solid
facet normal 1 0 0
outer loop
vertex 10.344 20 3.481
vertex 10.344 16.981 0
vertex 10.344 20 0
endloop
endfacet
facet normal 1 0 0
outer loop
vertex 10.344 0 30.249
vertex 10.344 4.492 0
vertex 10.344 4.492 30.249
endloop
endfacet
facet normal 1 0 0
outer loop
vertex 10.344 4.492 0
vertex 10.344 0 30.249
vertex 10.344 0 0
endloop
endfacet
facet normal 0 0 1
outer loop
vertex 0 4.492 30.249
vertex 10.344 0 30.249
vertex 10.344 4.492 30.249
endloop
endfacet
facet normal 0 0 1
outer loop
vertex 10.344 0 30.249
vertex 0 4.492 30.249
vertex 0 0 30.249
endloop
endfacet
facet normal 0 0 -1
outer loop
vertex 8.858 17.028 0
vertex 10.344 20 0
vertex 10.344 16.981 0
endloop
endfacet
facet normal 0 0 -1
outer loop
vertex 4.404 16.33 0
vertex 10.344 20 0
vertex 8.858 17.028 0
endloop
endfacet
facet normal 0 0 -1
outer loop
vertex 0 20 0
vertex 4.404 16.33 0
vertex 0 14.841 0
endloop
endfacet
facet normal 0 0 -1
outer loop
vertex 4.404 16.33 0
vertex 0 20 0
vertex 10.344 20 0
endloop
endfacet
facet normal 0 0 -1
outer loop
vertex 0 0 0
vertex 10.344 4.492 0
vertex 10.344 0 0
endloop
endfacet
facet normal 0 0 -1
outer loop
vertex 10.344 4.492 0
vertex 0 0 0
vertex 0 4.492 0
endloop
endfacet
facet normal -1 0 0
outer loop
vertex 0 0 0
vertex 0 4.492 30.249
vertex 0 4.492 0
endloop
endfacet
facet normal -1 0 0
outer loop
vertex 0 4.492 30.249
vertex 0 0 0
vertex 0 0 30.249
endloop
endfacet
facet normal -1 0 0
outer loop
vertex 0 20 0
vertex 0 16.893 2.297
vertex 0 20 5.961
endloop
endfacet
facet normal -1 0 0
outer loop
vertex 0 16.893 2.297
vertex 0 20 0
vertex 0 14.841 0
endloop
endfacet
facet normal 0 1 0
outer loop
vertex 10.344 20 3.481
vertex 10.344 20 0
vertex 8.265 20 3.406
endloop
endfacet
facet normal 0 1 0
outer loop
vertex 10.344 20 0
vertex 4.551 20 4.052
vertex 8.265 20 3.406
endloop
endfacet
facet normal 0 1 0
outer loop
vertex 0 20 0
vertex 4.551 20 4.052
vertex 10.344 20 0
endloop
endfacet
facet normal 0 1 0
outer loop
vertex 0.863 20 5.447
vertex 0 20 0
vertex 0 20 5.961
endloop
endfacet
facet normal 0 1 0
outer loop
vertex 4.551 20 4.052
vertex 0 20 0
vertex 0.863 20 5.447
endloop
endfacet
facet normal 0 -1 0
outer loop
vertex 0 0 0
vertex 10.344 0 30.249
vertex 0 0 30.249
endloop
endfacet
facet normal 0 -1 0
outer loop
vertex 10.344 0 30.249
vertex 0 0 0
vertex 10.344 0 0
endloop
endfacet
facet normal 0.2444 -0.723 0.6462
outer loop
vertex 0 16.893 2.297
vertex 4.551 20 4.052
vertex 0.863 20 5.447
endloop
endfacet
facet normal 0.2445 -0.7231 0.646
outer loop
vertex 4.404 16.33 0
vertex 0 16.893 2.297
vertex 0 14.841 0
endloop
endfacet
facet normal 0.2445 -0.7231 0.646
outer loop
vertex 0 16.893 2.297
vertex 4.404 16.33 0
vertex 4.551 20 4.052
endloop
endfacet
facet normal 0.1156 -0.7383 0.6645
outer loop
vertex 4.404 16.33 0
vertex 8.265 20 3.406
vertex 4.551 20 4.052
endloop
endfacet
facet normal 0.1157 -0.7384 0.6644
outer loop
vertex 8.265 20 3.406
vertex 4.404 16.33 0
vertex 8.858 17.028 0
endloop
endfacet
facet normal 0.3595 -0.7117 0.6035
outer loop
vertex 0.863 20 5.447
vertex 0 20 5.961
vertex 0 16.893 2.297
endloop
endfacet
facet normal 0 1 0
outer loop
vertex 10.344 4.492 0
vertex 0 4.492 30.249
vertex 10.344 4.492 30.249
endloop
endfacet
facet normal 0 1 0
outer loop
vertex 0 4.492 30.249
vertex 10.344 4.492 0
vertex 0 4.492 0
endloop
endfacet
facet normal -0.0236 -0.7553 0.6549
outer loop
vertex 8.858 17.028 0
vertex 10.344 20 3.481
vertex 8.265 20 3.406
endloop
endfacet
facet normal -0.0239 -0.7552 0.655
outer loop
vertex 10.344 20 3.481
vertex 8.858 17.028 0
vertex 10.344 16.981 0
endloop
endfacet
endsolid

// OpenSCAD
// v_groove finger  params={"finger_length": 30.248727985464548, "groove_angle": 104.00722578966771, "groove_depth": 15.50794286362226, "pad_width": 10.343630596416128}
difference(){cube([10.343630596416128,20,30.248727985464548]); translate([5.171815298208064,20,21.174109589825182]) rotate([90,0,0]) rotate([0,0,45]) scale([1,1.280,1]) cylinder(h=31.01588572724452,r1=0,r2=31.01588572724452,center=true);}
